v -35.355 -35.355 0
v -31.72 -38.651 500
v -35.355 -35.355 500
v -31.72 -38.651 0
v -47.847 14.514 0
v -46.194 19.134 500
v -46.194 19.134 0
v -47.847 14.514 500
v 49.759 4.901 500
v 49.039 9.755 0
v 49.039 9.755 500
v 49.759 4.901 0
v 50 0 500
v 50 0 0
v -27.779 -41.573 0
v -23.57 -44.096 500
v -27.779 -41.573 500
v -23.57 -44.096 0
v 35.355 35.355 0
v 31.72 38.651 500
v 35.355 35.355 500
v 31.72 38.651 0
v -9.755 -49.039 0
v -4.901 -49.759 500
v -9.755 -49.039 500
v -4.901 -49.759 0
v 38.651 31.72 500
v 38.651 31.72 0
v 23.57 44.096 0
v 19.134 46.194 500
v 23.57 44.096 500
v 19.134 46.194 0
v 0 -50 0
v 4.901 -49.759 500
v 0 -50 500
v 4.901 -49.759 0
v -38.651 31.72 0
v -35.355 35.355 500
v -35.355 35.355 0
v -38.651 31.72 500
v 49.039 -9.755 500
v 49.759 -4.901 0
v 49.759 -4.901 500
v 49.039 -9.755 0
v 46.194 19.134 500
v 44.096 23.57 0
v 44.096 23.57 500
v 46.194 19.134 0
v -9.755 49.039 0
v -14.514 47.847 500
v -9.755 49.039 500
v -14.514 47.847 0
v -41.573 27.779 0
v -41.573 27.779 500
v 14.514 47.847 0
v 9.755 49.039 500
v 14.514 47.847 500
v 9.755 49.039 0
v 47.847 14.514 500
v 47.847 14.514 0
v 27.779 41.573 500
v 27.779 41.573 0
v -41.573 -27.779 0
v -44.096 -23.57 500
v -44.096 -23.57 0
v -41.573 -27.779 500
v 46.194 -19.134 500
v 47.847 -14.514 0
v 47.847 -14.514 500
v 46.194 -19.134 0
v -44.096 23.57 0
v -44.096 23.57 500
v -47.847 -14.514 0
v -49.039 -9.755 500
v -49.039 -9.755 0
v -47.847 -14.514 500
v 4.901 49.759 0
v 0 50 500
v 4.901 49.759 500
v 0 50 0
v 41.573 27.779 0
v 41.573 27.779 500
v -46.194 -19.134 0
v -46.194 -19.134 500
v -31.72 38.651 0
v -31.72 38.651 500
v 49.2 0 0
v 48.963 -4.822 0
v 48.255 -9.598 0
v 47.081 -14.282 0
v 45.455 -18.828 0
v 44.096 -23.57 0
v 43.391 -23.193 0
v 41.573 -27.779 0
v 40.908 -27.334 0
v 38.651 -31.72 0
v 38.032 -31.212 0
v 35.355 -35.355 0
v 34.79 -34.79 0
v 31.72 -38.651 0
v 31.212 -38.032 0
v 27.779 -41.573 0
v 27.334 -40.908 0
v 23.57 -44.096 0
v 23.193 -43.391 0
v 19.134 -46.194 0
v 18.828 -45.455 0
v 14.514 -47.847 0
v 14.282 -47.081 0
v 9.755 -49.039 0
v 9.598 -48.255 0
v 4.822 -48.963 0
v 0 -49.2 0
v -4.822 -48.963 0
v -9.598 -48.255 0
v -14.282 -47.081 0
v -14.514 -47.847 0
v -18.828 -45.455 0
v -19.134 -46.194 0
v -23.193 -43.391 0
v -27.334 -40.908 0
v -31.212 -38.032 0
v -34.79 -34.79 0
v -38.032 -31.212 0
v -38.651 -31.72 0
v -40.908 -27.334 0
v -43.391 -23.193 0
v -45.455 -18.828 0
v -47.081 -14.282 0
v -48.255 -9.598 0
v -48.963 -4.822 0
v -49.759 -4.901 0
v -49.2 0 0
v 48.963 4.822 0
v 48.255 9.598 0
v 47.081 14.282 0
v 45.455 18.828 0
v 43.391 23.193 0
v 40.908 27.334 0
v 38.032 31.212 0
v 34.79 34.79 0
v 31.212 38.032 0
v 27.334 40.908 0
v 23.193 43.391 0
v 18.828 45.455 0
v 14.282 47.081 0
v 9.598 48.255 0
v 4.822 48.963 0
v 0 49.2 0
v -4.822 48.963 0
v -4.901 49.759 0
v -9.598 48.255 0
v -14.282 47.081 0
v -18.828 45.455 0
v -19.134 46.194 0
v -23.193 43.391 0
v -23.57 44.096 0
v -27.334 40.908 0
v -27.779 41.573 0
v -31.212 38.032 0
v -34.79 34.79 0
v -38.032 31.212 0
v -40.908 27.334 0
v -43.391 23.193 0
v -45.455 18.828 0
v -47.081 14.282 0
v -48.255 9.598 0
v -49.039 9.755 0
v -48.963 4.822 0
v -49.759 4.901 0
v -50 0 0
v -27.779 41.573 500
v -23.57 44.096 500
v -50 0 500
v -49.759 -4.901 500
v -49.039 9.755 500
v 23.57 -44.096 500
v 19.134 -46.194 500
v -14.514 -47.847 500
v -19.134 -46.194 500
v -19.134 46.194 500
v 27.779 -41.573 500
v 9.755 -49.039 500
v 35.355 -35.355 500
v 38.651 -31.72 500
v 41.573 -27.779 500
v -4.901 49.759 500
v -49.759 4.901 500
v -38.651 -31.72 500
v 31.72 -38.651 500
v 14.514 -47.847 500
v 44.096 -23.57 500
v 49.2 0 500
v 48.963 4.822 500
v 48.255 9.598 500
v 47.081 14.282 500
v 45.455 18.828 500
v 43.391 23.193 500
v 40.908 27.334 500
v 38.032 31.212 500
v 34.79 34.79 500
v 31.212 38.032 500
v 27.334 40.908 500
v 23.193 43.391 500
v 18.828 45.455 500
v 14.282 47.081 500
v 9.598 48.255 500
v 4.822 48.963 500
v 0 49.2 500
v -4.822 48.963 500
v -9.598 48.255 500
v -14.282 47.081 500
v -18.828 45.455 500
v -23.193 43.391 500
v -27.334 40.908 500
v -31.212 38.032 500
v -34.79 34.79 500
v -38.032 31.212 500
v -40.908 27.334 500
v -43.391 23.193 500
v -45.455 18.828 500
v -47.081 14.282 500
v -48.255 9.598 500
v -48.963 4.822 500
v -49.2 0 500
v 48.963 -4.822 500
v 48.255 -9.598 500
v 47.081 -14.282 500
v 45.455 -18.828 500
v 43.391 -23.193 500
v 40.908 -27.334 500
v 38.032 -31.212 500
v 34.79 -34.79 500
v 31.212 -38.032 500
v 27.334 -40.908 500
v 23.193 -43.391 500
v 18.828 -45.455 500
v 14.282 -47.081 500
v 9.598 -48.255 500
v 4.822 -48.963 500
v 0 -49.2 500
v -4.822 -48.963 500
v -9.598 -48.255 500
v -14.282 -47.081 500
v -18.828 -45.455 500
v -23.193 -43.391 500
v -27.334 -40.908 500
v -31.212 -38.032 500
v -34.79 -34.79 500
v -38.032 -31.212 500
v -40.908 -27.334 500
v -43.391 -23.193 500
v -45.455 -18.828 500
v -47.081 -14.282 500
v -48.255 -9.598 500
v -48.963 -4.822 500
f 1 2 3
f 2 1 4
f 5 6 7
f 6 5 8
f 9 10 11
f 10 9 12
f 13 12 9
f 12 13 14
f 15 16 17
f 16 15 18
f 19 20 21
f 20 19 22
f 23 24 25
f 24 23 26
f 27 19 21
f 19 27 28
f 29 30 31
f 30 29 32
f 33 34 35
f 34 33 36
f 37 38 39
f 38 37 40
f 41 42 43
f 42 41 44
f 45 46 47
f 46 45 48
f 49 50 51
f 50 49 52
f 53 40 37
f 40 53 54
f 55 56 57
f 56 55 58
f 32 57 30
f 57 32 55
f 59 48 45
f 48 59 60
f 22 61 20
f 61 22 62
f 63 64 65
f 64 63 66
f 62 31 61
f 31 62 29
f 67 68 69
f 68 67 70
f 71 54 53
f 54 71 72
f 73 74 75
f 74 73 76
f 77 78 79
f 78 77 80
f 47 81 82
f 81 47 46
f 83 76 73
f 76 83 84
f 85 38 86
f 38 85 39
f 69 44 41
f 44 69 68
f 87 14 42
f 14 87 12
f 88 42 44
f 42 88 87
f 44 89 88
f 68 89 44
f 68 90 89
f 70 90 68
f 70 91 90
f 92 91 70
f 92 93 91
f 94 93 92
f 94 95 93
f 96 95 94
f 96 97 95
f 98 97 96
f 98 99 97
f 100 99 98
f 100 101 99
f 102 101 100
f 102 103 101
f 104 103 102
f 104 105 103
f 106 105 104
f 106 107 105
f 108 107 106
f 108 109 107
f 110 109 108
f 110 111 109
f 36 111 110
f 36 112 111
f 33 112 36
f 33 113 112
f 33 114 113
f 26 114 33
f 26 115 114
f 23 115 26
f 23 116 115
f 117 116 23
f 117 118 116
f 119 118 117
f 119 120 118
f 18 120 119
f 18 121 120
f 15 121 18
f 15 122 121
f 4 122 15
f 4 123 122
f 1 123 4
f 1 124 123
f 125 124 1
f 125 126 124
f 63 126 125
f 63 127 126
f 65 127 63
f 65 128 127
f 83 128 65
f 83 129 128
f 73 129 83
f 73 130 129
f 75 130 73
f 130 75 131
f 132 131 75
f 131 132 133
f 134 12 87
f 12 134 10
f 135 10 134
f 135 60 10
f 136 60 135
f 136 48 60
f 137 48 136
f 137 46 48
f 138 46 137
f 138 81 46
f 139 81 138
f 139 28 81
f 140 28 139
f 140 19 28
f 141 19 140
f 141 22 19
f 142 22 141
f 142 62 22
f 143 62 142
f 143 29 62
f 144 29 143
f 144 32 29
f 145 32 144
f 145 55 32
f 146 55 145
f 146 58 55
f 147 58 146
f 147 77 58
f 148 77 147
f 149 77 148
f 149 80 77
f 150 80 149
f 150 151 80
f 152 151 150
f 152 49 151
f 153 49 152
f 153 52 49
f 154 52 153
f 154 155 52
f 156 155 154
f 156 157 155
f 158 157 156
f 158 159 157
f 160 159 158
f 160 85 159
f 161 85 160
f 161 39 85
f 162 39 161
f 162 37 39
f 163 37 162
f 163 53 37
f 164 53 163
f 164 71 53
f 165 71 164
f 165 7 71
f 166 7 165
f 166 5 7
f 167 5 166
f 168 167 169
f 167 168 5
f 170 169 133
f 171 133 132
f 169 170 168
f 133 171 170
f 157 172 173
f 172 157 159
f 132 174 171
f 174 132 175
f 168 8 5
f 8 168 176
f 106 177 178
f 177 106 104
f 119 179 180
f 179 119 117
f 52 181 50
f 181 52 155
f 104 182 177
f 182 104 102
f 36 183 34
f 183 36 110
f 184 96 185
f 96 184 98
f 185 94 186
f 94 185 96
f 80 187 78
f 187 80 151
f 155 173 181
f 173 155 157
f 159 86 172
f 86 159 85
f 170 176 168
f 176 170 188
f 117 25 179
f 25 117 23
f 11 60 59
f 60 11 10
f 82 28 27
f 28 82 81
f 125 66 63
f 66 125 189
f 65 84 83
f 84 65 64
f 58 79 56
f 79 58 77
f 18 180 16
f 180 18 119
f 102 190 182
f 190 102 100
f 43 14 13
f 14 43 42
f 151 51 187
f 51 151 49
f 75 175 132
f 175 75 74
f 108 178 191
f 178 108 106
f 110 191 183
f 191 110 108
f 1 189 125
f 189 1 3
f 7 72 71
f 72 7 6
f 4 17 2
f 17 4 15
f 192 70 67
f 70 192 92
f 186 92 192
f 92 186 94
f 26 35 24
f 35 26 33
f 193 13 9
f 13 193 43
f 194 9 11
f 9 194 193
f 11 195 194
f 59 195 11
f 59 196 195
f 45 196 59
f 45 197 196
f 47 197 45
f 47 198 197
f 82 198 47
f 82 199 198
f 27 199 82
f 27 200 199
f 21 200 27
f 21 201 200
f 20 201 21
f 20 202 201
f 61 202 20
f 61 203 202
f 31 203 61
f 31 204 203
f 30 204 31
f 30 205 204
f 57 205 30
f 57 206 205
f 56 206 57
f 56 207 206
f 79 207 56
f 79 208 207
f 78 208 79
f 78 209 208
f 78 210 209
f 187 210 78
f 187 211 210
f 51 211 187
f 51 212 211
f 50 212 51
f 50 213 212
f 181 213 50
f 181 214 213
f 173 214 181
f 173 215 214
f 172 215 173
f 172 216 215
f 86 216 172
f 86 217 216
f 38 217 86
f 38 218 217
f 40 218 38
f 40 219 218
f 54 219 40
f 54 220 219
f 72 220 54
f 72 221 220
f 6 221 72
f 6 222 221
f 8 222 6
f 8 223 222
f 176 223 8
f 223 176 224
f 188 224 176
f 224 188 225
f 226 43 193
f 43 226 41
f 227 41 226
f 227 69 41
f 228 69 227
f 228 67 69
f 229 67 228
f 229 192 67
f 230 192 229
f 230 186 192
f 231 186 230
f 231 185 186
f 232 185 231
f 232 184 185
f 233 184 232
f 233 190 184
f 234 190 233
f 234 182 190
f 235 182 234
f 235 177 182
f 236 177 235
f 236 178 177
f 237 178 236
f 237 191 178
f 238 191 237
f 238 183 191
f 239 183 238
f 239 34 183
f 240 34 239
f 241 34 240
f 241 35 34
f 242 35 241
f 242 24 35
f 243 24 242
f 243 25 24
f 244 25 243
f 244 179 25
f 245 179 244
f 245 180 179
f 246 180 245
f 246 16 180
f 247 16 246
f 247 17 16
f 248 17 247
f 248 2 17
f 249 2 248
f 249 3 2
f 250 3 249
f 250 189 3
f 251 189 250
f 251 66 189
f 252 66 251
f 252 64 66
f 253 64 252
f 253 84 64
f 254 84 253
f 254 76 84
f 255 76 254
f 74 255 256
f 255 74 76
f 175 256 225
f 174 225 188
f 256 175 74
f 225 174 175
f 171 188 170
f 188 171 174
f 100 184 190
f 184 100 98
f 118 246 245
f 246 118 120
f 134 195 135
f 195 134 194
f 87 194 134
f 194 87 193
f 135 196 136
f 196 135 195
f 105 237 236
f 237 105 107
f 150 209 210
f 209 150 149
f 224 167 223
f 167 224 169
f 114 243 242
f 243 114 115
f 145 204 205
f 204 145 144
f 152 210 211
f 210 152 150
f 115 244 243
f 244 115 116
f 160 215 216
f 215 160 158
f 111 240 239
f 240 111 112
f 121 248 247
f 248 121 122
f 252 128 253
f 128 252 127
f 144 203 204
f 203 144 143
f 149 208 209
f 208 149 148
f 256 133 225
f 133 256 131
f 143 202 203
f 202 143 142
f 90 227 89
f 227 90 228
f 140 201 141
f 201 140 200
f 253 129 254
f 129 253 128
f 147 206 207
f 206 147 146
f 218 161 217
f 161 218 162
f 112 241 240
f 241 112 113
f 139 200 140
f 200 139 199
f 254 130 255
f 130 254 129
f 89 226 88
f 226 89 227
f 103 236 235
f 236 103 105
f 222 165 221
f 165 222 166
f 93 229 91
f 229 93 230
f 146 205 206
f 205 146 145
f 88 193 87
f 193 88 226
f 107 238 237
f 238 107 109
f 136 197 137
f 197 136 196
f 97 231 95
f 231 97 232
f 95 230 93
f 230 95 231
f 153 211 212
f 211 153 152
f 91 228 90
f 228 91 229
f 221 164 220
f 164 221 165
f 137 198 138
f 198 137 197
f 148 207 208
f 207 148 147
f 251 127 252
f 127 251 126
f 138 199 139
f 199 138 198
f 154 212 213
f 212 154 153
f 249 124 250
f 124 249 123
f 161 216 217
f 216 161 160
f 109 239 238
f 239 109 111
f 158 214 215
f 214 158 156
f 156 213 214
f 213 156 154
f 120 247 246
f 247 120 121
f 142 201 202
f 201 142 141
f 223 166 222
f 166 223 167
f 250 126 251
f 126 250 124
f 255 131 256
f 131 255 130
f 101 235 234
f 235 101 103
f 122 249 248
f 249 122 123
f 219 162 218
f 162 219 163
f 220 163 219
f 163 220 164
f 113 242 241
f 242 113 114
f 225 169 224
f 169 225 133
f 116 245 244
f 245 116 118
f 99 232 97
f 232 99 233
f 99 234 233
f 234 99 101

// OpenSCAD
// Circular straight duct segment -- parametric test model for
// freecad/HVAC/library/openscad_shapes.py (HVACLibraryAPI.shape_from_openscad),
// wired up by build_circular_straight_openscad in
// freecad/HVAC/libraries/smacna/generators/segments.py.
//
// Canonical local frame (must match the Python generator's placement
// transform -- see build_circular_straight_openscad):
//   - Local origin = port 0 (start port)
//   - Local +Z axis = duct axis, pointing toward port 1 (end port)
//   - The tube is drawn along +Z from z=0 to z=length
//
// Parameters below are the customizer defaults; the generator overrides
// diameter/thickness/length via `openscad -D name=value` on every render.
// $fn is NOT overridden from Python (see openscad_shapes.py's module
// docstring for why) -- edit the default below directly to change facet
// quality.

diameter = 100;   // outer diameter, mm
thickness = 0.8;  // sheet metal wall thickness, mm
length = 500;     // duct length (port0 to port1 distance), mm

$fn = 64;

module circular_duct(diameter, thickness, length) {
    outer_r = diameter / 2;
    inner_r = max(outer_r - thickness, 0.1);

    difference() {
        cylinder(h = length, r = outer_r, center = false);
        translate([0, 0, -1])
            cylinder(h = length + 2, r = inner_r, center = false);
    }
}

circular_duct(diameter, thickness, length);
